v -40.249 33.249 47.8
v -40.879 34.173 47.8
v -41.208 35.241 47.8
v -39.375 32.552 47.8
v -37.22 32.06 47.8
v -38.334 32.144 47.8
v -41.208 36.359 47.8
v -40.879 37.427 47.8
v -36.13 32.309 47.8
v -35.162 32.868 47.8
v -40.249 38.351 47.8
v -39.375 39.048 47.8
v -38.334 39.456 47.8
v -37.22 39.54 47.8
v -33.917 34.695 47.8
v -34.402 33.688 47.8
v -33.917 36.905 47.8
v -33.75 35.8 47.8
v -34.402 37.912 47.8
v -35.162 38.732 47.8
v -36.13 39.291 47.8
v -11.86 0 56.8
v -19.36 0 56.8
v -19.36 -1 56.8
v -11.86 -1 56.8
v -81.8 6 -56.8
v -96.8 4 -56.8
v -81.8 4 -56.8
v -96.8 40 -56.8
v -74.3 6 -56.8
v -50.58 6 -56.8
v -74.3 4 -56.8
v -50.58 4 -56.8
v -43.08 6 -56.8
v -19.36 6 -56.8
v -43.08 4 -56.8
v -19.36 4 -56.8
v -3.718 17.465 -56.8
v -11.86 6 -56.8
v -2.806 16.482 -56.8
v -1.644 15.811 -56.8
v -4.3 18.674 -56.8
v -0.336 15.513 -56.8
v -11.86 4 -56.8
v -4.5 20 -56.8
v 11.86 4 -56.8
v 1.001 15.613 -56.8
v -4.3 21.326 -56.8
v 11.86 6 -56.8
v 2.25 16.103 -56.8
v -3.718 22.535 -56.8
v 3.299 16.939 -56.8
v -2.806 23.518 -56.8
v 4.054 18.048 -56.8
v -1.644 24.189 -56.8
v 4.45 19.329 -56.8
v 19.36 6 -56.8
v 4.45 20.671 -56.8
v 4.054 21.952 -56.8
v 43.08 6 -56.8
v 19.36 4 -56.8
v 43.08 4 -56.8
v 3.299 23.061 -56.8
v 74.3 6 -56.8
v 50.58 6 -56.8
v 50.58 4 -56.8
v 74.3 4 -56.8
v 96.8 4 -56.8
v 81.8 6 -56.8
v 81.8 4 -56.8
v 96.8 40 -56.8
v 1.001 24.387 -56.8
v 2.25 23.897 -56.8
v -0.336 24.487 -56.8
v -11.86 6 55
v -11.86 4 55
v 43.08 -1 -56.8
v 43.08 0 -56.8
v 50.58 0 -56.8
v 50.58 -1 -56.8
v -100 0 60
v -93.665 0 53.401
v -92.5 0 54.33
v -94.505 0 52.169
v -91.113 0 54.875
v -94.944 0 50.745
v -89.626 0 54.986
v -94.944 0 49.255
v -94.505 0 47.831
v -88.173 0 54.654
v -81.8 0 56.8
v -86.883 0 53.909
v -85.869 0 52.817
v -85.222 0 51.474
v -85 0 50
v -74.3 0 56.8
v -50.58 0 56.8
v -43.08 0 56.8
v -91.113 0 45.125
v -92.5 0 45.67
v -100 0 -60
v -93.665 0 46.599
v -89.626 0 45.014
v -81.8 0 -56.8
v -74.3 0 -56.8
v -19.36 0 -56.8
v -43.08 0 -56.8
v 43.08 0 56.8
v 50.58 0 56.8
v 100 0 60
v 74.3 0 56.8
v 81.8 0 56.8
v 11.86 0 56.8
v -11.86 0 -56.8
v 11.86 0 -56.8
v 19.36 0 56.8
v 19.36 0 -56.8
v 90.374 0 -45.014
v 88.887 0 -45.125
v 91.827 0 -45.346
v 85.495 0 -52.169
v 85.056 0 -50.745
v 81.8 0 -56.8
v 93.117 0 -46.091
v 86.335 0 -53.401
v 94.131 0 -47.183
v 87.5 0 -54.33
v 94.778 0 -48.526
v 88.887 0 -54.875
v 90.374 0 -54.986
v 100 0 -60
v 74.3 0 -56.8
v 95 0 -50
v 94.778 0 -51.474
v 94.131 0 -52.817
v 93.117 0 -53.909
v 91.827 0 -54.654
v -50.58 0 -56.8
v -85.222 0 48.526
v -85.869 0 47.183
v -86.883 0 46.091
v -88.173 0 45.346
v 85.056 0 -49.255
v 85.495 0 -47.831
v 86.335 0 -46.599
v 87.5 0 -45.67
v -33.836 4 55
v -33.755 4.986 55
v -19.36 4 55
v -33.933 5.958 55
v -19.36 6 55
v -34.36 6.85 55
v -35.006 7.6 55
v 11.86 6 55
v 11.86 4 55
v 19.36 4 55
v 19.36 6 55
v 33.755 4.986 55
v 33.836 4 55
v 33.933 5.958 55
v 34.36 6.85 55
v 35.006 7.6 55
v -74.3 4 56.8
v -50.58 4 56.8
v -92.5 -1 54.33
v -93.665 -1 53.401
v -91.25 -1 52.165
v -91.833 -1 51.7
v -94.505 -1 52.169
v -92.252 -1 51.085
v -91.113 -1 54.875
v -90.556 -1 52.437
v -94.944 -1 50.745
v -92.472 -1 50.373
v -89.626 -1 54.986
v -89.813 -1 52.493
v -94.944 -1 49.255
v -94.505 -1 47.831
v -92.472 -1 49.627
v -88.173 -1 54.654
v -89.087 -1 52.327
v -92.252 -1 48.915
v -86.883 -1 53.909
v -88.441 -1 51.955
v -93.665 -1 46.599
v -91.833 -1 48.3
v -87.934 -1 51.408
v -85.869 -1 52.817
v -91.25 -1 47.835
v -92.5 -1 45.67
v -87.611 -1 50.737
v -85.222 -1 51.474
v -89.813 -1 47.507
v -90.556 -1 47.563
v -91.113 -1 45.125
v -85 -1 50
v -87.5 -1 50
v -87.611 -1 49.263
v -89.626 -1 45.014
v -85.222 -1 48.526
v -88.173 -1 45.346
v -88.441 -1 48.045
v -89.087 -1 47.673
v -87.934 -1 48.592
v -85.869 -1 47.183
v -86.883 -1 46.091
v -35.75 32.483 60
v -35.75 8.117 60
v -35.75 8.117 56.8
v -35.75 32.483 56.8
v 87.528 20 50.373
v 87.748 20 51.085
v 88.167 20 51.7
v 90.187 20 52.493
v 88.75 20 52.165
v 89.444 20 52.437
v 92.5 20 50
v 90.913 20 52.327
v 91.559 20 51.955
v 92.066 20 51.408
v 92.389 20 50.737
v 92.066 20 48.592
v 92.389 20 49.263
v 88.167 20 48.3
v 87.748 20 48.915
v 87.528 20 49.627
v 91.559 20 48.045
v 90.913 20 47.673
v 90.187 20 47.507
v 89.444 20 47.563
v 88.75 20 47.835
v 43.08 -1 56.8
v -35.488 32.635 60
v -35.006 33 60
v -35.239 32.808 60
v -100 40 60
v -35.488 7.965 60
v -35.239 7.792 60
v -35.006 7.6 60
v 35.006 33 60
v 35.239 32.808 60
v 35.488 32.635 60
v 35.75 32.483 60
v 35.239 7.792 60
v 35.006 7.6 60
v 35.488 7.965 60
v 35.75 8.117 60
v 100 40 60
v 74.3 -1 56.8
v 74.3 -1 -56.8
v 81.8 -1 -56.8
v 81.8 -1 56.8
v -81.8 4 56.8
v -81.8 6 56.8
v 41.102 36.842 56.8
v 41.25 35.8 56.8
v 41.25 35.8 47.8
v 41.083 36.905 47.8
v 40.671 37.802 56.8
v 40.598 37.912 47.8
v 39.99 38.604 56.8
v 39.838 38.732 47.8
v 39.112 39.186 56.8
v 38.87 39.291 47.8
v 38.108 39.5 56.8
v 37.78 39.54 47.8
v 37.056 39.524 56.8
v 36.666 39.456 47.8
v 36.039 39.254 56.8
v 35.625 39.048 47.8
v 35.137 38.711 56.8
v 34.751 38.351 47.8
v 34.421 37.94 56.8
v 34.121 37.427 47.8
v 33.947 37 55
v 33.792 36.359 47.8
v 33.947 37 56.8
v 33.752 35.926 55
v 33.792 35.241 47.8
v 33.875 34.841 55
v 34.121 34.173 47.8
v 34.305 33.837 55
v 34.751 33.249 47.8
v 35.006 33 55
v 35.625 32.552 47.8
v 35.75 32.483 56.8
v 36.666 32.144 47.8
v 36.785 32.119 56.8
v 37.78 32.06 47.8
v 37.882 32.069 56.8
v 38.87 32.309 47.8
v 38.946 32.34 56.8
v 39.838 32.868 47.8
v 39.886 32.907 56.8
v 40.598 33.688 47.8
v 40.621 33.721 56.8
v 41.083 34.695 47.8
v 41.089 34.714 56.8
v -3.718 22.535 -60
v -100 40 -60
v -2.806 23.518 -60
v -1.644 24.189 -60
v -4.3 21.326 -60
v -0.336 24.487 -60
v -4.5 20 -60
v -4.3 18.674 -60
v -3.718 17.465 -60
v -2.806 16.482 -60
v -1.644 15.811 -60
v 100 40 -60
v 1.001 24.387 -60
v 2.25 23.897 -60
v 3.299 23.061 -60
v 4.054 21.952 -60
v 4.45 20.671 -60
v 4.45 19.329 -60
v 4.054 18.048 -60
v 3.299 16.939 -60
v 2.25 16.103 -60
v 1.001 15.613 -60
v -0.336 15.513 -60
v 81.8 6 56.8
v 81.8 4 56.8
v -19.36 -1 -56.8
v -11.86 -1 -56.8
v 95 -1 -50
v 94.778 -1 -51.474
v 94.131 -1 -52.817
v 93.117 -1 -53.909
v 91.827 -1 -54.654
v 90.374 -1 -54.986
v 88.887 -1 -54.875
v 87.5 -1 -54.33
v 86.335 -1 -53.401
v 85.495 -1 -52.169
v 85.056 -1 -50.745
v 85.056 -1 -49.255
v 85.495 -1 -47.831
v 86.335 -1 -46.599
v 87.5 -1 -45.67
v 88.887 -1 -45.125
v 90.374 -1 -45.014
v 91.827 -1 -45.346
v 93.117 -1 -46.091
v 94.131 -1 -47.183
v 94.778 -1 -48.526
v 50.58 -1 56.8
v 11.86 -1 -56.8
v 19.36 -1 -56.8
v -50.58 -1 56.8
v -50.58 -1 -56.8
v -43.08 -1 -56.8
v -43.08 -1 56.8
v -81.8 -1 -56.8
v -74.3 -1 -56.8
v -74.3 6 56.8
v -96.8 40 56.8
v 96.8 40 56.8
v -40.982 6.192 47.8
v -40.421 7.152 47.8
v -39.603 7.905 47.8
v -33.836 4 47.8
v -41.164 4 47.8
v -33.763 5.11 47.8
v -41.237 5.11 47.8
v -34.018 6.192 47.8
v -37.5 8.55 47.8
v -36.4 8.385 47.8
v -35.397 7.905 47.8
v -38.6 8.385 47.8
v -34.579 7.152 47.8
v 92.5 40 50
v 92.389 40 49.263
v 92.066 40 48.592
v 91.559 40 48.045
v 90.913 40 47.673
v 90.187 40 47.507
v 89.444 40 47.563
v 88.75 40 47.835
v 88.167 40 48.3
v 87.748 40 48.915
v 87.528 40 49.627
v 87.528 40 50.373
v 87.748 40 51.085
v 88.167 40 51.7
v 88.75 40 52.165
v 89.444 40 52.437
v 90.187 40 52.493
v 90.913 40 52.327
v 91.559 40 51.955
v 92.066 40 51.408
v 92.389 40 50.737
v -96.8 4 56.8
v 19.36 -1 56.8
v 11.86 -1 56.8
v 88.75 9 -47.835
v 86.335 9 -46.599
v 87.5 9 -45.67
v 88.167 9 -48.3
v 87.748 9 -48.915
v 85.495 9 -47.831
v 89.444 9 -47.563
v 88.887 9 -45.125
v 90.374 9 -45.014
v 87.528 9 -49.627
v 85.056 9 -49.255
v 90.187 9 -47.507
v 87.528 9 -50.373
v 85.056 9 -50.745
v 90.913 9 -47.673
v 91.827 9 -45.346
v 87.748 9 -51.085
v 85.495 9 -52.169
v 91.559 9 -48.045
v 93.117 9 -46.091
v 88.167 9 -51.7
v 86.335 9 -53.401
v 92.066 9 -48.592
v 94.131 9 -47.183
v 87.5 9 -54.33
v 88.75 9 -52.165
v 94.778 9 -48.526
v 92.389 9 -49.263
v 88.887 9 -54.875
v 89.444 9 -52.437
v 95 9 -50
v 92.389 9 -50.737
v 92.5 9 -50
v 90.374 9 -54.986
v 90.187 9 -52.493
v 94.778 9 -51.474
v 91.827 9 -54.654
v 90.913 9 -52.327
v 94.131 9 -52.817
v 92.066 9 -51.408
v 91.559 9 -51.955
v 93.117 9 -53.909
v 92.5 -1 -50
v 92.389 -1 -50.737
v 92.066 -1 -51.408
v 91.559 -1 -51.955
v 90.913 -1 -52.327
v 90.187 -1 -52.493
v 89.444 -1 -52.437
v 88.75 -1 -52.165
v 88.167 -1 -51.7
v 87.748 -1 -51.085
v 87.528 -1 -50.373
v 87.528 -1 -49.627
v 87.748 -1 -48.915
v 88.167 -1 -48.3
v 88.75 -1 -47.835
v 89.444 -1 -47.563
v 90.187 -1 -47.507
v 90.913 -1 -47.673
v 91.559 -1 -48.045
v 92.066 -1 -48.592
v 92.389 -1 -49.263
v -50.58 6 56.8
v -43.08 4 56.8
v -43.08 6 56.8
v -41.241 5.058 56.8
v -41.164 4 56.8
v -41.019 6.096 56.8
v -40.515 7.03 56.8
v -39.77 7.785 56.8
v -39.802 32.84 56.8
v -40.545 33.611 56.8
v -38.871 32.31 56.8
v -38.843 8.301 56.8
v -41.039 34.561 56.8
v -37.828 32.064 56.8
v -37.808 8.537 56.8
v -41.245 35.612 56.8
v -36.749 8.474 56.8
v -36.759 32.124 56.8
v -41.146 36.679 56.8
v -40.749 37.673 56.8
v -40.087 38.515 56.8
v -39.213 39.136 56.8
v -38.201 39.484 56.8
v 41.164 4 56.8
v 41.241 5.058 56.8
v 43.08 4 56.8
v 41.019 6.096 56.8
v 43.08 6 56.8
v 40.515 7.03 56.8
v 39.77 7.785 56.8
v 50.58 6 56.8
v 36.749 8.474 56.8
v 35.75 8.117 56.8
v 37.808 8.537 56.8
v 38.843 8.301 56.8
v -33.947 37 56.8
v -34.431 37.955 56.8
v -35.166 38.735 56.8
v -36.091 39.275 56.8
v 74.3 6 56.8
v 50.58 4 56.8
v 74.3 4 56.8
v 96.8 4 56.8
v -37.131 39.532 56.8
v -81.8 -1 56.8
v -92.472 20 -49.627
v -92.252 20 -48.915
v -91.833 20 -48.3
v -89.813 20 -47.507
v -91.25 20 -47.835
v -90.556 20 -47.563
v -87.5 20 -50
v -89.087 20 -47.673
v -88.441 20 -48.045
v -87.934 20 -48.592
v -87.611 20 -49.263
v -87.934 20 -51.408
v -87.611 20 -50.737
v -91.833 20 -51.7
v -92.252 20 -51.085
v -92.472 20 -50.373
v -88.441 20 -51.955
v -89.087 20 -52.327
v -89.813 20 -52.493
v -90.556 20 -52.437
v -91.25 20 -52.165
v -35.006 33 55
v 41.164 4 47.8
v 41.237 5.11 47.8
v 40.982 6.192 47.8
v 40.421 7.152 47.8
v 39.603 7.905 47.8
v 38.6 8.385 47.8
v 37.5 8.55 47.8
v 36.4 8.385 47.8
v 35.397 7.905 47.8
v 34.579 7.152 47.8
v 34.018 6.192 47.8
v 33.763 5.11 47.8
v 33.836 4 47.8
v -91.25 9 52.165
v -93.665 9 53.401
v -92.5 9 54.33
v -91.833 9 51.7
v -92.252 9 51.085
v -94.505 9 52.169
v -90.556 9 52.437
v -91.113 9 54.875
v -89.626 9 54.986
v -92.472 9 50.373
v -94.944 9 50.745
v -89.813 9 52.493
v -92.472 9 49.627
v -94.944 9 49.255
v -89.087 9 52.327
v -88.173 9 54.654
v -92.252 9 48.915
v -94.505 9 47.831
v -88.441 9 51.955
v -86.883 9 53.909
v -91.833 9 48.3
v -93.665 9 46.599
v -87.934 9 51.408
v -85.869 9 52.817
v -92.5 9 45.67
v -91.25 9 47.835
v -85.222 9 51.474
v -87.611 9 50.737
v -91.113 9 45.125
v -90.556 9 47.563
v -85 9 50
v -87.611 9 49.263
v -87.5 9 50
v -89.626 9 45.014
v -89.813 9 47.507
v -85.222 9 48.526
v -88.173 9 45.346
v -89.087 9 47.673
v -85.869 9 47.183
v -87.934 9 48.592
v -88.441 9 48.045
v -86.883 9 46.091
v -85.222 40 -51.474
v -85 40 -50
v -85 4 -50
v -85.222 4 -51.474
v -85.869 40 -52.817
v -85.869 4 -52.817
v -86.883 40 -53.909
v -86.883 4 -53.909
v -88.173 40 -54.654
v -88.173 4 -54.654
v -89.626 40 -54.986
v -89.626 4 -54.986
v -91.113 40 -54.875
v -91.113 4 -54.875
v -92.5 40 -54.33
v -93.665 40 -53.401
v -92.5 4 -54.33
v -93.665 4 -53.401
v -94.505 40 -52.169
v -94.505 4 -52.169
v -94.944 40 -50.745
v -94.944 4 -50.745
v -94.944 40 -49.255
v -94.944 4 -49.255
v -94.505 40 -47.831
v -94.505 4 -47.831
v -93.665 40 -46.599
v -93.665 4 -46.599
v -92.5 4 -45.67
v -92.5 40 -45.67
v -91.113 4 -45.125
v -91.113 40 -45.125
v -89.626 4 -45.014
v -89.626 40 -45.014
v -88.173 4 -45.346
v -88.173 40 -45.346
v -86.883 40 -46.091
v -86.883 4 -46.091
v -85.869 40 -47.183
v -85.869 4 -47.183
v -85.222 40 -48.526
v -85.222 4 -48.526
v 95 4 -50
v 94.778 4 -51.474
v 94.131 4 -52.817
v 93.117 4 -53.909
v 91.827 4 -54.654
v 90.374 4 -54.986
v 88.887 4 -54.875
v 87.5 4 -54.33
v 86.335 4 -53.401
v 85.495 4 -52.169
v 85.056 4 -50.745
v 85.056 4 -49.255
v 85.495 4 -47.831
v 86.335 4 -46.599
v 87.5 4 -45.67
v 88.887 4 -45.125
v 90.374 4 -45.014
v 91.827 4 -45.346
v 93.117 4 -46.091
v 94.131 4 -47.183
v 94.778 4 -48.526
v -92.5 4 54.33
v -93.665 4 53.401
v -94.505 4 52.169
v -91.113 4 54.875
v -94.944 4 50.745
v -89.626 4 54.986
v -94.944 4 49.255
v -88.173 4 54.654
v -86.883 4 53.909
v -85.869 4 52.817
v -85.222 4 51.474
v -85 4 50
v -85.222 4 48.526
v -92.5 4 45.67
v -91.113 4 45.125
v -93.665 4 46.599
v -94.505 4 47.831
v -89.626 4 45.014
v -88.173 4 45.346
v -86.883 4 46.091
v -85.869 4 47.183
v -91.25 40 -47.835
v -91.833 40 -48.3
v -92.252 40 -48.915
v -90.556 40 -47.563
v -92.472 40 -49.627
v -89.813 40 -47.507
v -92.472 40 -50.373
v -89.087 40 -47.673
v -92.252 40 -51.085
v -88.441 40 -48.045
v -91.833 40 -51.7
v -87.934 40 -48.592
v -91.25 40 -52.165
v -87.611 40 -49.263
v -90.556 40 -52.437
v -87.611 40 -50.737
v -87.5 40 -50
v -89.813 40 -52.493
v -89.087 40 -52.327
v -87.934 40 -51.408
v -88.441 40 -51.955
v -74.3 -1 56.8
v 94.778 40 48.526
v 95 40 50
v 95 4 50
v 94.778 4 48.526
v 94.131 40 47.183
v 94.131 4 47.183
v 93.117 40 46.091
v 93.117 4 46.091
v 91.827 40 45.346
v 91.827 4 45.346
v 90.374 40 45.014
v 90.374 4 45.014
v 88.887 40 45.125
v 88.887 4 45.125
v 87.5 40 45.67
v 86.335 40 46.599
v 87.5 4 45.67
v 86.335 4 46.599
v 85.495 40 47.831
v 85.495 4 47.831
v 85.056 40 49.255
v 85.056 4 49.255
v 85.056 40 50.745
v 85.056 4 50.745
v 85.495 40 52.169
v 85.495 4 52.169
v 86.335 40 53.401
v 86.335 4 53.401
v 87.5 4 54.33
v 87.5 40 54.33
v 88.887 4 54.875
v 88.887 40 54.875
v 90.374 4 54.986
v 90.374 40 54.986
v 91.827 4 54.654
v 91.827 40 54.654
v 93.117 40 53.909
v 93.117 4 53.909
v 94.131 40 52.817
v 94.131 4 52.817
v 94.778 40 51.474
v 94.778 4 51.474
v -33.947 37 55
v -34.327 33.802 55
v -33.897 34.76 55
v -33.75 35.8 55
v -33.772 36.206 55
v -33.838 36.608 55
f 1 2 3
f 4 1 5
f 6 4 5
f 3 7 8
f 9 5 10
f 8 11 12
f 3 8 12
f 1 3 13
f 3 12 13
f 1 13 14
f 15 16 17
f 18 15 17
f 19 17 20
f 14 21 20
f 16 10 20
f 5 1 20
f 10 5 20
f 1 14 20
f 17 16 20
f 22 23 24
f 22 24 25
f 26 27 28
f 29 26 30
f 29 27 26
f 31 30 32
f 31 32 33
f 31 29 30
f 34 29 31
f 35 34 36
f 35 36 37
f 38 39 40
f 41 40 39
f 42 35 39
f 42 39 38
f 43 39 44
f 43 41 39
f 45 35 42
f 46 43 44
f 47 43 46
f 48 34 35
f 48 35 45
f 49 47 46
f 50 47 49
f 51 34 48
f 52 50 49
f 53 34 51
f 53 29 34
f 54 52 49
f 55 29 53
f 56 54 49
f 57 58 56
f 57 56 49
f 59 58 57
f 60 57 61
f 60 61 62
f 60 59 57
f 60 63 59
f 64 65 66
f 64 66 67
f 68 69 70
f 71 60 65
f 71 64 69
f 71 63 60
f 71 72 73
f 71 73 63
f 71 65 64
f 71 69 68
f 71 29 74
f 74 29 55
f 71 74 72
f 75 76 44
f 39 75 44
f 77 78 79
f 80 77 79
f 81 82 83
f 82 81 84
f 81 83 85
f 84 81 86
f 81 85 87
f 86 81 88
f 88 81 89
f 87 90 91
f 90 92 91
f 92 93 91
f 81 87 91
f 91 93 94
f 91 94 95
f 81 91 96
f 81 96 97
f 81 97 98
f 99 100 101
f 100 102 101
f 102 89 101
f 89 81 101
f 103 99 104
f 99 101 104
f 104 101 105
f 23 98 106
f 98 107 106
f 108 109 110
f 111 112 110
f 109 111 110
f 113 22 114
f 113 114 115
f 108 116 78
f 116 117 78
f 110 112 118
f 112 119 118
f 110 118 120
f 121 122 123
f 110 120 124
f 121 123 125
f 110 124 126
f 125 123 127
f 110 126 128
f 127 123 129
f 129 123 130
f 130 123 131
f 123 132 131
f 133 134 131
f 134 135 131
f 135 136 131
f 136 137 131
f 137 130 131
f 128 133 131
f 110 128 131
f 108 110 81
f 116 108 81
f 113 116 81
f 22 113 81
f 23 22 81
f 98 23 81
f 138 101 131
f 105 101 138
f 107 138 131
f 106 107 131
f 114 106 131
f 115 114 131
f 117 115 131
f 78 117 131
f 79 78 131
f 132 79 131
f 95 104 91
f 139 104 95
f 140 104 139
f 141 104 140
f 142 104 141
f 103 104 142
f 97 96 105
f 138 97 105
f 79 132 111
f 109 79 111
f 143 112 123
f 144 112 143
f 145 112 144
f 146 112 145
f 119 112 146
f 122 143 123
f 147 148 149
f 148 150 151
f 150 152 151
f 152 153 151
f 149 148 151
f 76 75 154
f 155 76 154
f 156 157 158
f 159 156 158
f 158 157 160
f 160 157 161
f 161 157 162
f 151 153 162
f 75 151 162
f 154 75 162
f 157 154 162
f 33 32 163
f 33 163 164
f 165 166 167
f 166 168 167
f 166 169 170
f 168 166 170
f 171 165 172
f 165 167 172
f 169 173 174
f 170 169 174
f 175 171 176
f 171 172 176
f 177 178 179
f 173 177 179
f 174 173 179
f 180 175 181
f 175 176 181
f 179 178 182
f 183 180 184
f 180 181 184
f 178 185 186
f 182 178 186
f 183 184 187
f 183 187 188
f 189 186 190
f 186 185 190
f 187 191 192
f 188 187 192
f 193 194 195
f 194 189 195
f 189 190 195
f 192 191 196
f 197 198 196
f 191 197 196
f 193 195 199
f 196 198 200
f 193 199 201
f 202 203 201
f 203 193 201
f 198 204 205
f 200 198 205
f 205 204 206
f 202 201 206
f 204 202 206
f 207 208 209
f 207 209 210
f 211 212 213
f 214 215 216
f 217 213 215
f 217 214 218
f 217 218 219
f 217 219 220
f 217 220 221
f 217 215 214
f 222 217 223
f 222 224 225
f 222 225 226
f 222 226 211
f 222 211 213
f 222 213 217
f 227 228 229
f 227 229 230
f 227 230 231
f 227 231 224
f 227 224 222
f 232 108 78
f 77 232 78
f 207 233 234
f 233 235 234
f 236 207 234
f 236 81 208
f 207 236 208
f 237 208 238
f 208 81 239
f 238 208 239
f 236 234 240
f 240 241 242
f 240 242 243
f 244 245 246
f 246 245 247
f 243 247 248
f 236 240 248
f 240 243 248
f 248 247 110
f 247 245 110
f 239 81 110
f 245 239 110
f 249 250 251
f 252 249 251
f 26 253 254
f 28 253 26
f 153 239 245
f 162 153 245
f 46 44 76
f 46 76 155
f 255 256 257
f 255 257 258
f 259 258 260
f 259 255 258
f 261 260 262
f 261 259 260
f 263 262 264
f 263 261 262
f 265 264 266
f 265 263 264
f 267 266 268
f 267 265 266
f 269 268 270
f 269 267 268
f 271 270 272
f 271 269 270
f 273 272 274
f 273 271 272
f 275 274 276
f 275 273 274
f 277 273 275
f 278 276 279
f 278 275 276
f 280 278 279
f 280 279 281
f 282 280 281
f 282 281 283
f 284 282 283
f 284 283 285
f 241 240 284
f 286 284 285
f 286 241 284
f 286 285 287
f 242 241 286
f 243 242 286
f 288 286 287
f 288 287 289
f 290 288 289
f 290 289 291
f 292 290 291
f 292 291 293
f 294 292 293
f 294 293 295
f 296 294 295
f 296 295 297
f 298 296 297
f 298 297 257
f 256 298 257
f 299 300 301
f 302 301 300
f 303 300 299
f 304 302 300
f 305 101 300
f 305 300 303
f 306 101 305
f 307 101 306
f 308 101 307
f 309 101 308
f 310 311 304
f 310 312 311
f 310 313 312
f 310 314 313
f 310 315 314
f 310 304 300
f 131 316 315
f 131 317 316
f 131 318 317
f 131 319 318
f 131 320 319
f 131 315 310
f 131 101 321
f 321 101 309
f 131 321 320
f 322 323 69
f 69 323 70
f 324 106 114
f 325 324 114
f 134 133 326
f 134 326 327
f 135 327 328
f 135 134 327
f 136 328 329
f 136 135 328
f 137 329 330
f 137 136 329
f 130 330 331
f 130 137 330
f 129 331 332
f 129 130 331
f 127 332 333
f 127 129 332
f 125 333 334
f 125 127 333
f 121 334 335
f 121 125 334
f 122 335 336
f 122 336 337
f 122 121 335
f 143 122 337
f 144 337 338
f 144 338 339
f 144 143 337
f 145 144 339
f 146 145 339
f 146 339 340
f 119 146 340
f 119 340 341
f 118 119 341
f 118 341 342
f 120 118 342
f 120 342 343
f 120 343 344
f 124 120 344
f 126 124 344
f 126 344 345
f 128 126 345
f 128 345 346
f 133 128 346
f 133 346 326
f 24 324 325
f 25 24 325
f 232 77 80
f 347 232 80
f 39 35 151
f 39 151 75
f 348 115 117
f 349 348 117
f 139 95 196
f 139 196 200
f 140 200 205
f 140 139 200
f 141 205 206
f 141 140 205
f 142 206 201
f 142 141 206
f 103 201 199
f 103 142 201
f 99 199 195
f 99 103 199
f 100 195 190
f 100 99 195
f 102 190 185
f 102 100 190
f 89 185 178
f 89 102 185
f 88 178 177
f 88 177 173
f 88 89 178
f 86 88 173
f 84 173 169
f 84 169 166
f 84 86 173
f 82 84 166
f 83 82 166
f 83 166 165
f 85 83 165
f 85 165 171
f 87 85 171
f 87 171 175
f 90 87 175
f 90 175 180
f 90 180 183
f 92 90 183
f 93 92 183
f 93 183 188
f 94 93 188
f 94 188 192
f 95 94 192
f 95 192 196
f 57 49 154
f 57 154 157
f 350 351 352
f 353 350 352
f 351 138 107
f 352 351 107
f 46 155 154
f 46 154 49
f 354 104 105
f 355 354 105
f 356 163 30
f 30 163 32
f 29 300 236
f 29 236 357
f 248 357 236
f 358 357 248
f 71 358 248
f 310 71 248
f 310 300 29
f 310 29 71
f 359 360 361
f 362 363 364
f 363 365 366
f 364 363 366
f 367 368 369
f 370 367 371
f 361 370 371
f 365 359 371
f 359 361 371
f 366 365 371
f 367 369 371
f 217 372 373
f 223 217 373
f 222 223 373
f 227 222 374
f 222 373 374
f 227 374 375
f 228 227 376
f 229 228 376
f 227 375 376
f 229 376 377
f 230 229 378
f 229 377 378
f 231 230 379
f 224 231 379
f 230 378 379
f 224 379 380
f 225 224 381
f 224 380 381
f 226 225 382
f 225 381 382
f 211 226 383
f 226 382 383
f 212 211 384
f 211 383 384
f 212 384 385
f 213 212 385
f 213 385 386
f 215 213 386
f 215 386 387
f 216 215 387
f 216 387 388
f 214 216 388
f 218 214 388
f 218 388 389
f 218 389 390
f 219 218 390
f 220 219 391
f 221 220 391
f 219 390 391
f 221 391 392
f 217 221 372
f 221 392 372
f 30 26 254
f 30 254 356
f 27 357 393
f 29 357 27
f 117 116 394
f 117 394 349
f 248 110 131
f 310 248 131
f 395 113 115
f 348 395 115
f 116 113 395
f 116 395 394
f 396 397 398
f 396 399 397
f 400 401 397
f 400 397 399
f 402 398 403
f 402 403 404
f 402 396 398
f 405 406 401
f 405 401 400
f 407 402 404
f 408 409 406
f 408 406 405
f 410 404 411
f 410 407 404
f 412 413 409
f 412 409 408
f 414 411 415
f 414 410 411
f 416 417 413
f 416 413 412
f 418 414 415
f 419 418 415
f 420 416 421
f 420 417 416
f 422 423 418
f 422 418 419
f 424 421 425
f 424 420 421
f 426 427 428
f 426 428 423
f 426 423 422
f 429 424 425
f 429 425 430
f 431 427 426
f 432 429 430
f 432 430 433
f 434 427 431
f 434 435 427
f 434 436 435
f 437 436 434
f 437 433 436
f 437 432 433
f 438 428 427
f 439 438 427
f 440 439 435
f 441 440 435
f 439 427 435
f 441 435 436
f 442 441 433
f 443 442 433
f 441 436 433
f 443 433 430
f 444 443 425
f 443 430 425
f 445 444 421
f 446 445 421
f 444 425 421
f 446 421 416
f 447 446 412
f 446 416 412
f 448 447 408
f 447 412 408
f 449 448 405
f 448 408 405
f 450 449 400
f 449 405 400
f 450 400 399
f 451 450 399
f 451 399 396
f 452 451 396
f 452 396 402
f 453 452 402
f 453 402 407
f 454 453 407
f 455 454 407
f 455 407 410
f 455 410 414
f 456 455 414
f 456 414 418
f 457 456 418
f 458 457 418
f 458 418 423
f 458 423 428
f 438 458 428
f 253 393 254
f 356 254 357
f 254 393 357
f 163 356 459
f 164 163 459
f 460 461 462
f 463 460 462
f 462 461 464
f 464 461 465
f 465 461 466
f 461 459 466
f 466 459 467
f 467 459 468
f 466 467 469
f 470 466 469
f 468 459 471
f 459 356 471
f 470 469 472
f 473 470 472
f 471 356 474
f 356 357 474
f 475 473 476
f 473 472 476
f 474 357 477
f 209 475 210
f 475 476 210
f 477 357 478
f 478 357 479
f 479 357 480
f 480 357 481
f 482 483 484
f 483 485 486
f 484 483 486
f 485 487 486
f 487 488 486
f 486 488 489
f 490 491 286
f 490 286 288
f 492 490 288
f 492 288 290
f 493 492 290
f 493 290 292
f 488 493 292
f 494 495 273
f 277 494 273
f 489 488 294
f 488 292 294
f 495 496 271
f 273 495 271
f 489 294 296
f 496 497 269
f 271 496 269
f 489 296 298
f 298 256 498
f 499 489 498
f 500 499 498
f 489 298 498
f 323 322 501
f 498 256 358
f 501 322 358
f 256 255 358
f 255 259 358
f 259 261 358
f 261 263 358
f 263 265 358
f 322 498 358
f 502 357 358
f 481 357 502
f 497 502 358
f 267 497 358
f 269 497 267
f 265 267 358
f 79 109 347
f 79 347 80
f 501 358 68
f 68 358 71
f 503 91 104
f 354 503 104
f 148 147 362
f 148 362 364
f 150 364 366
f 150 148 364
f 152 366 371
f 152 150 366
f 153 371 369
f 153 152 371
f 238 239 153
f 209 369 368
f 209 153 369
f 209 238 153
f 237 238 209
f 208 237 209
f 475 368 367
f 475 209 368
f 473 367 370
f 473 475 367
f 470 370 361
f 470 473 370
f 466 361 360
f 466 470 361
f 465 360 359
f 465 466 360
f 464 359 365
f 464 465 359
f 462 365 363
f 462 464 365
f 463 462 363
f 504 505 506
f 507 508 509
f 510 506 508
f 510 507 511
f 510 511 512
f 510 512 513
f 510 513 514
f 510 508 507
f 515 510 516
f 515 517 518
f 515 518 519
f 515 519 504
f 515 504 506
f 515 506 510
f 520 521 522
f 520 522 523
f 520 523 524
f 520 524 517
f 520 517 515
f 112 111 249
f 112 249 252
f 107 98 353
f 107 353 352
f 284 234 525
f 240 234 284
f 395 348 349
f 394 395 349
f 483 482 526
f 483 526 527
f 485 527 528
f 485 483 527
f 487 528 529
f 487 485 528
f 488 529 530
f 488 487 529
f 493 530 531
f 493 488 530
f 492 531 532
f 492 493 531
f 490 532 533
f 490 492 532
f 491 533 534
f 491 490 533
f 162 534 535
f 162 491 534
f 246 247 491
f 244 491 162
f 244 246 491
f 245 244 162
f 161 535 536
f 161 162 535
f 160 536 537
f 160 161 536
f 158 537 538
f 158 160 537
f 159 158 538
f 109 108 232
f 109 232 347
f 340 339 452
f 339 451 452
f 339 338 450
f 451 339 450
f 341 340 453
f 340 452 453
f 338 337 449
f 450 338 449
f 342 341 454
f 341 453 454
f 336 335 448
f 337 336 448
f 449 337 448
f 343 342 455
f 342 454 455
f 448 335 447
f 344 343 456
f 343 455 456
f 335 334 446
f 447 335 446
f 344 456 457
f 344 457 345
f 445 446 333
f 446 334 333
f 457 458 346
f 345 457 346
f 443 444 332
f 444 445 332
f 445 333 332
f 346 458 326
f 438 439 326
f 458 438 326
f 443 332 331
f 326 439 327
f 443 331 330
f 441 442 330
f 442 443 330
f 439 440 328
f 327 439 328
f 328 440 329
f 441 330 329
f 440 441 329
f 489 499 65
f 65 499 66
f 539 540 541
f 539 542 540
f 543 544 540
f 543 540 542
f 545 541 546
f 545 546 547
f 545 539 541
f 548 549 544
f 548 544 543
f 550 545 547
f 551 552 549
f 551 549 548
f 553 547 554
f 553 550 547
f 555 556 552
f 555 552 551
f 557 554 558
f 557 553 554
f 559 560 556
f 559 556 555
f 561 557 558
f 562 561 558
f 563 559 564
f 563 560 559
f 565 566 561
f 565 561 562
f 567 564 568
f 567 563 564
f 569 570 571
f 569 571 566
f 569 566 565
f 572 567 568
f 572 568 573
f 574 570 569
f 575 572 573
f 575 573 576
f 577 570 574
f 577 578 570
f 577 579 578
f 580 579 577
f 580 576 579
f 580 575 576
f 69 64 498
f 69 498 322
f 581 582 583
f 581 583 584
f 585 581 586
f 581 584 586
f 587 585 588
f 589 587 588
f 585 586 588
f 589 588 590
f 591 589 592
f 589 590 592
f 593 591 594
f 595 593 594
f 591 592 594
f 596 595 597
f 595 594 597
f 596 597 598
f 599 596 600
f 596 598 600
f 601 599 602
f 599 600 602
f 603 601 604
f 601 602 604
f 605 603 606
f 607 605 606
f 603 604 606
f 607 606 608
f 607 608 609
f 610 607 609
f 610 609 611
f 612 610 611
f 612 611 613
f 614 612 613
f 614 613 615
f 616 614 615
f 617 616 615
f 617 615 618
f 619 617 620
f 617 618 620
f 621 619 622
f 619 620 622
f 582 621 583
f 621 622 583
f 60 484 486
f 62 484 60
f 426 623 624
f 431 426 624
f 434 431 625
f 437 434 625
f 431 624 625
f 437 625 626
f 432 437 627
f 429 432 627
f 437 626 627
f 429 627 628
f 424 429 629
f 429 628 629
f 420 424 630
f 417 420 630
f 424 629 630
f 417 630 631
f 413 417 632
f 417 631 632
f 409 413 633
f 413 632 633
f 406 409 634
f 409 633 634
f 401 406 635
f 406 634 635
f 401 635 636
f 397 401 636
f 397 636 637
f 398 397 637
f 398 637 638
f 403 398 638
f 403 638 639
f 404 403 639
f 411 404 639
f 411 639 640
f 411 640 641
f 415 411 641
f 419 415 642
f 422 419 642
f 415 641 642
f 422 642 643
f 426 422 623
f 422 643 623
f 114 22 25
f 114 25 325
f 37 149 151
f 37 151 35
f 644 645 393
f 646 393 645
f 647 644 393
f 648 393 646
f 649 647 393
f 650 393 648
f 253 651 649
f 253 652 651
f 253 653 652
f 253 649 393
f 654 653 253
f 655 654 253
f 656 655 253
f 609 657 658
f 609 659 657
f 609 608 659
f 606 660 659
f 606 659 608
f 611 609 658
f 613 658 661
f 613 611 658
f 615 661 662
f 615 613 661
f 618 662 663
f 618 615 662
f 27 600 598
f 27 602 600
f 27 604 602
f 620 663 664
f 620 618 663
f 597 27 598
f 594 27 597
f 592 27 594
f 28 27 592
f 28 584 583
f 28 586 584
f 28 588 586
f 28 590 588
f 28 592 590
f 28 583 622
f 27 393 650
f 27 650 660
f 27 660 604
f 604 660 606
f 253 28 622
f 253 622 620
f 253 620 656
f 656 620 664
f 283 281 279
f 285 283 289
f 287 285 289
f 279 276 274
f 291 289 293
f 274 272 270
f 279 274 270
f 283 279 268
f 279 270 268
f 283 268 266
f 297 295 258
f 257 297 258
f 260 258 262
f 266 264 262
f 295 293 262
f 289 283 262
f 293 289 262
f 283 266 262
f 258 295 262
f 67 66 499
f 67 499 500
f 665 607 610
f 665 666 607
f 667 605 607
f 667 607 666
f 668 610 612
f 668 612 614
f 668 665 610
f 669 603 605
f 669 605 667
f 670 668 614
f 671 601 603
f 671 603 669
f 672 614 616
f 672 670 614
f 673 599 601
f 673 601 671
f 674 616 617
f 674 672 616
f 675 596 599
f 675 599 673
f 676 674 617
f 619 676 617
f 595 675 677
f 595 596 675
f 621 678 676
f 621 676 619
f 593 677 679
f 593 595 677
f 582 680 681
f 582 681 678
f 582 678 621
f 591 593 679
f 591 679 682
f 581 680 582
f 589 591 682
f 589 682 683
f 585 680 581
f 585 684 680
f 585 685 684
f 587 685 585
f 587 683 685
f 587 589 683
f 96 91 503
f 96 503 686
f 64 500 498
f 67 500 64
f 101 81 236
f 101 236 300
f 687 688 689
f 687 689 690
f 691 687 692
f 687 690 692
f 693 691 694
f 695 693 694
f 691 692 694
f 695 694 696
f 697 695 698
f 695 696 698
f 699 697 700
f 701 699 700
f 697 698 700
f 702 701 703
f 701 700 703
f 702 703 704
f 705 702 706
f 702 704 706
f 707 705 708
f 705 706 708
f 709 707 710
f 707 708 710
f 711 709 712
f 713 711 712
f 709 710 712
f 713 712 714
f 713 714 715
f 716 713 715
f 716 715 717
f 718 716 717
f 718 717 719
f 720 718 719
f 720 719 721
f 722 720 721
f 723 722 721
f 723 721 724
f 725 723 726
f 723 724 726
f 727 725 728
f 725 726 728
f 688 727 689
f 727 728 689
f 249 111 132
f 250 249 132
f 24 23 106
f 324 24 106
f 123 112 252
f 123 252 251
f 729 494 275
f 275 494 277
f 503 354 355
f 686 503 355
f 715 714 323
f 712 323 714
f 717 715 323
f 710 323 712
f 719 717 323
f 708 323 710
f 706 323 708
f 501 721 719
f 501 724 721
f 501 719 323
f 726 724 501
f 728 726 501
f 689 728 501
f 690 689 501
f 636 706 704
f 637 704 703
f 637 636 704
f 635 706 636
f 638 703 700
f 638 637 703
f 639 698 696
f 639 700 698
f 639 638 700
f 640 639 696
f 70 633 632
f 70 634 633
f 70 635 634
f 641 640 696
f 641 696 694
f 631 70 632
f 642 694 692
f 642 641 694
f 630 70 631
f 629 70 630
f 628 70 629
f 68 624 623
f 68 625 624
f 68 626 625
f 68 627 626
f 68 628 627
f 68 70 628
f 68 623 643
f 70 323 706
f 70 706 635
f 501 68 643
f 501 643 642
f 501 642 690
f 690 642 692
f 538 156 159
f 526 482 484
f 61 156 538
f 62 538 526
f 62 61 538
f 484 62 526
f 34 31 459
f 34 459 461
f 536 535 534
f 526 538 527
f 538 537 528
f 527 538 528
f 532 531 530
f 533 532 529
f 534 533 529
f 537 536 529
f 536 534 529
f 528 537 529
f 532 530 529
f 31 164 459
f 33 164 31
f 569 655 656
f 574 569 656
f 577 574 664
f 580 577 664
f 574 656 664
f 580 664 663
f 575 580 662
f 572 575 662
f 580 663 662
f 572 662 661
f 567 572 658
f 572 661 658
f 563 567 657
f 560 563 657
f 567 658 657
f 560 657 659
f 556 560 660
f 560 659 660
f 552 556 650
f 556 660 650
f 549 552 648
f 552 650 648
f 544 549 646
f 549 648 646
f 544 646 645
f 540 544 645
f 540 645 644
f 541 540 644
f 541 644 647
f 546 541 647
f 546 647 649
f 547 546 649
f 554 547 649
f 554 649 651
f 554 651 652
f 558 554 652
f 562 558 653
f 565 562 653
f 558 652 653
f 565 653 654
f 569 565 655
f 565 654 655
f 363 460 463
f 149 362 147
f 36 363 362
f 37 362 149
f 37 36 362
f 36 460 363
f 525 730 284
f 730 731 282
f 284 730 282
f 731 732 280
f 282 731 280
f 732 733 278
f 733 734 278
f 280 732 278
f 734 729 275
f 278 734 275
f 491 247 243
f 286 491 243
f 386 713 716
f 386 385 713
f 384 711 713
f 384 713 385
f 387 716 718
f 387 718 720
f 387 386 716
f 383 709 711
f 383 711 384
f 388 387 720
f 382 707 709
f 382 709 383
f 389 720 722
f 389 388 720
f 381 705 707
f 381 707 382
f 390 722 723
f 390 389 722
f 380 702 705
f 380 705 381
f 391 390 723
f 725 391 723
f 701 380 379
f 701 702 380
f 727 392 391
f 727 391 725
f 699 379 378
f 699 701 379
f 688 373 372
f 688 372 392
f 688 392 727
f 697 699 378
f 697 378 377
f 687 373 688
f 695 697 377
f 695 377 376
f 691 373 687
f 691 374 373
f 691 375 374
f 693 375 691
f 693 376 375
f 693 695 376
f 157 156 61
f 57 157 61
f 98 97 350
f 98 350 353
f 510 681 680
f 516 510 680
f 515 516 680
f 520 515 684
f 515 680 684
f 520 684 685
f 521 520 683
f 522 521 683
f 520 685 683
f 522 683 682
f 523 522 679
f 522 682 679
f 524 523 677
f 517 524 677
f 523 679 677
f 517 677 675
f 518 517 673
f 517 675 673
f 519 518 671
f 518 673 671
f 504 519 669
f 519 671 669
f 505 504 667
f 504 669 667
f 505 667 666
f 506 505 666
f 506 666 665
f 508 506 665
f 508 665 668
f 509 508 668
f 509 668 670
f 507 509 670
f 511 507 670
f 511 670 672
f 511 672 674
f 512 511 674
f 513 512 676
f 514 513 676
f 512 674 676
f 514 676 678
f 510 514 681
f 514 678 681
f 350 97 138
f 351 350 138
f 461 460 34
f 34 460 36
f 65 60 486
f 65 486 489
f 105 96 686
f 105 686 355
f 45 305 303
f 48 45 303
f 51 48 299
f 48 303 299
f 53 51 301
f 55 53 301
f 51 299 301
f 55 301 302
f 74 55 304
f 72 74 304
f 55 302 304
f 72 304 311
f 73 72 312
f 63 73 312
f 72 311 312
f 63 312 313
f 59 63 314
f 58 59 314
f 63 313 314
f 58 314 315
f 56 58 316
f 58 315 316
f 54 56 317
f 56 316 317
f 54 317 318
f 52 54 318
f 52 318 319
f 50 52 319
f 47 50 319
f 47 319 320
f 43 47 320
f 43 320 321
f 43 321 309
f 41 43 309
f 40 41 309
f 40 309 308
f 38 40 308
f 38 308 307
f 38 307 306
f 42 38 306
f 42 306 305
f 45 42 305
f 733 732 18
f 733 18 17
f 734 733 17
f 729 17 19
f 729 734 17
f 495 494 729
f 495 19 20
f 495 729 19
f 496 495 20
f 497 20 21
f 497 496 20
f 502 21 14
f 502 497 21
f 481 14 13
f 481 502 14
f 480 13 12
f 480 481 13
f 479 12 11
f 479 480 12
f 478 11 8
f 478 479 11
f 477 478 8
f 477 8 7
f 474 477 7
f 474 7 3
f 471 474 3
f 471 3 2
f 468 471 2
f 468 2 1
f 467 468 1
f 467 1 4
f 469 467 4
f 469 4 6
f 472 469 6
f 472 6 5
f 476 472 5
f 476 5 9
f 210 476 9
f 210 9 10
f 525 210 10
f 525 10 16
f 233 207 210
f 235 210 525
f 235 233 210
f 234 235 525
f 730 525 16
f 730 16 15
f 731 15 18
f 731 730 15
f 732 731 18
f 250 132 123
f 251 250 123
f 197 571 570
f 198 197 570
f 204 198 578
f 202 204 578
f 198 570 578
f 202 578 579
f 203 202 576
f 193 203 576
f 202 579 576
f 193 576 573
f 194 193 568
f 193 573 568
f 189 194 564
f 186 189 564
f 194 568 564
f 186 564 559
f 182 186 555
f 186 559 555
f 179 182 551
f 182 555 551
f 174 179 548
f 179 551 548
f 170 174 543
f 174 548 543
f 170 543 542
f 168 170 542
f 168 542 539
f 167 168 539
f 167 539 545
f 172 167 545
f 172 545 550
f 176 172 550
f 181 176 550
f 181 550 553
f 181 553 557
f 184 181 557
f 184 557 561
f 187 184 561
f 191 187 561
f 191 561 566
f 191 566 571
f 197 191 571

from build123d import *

# Parameters (mm, degrees)
CROQUIS1_W                   = 200
CROQUIS1_H                   = 120
SALIENTE_EXTRUIR1_DEPTH      = 40
CROQUIS2_W                   = 193.6
CROQUIS2_H                   = 113.6
CORTAR_EXTRUIR1_DEPTH        = 36
CROQUIS3_W                   = 71.5
CROQUIS3_H                   = 25.4
CORTAR_EXTRUIR2_DEPTH        = 3.5
CROQUIS4_R                   = 3.75
SALIENTE_EXTRUIR2_DEPTH      = 12.2
CROQUIS5_W                   = 71.5
CROQUIS5_H                   = 4
SALIENTE_EXTRUIR3_DEPTH      = 5
SALIENTE_EXTRUIR4_DEPTH      = 2
SALIENTE_EXTRUIR4_DEPTH_BACK = 5
CROQUIS6_W                   = 7.5
CROQUIS6_H                   = 113.6
CROQUIS7_R                   = 4.5
CORTAR_EXTRUIR3_DEPTH        = 3.3
CROQUIS6_5_R                 = 5
SALIENTE_EXTRUIR5_DEPTH      = 36
SALIENTE_EXTRUIR6_DEPTH      = 5
SALIENTE_EXTRUIR6_DEPTH_BACK = 5
CROQUIS6_6_R                 = 5
CROQUIS8_R                   = 2.5
CORTAR_EXTRUIR4_DEPTH        = 20
CROQUIS9_R                   = 2.5
CORTAR_EXTRUIR5_DEPTH        = 121.66896867


with BuildPart() as part:
    # Croquis1 → Saliente-Extruir1 (new body)
    with BuildSketch(Plane(origin=(0, 0, 0), x_dir=(1, 0, 0), z_dir=(0, 1, 0))):
        Rectangle(CROQUIS1_W, CROQUIS1_H)
    extrude(amount=SALIENTE_EXTRUIR1_DEPTH)

    # Croquis2 → Cortar-Extruir1 (cut)
    with BuildSketch(Plane(origin=(0, 40, 0), x_dir=(1, 0, 0), z_dir=(0, 1, 0))):
        Rectangle(CROQUIS2_W, CROQUIS2_H)
    extrude(amount=-CORTAR_EXTRUIR1_DEPTH, mode=Mode.SUBTRACT)

    # Croquis3 → Cortar-Extruir2 (cut)
    with BuildSketch(Plane.XY.offset(60)):
        with Locations((0, 20.3)):
            Rectangle(CROQUIS3_W, CROQUIS3_H)
    extrude(amount=-CORTAR_EXTRUIR2_DEPTH, mode=Mode.SUBTRACT)

    # Croquis4 → Saliente-Extruir2 (add)
    with BuildSketch(Plane.XY.offset(60)):
        with Locations((-37.5, 35.8)):
            Circle(CROQUIS4_R)
        with Locations((37.5, 35.8)):
            Circle(CROQUIS4_R)
        with Locations((37.5, 4.8)):
            Circle(CROQUIS4_R)
        with Locations((-37.5, 4.8)):
            Circle(CROQUIS4_R)
    extrude(amount=-SALIENTE_EXTRUIR2_DEPTH)

    # Croquis5 → Saliente-Extruir3 (add)
    with BuildSketch(Plane.XY.offset(60)):
        with Locations((0, 5.6)):
            Rectangle(CROQUIS5_W, CROQUIS5_H)
        with Locations((0, 35)):
            Rectangle(CROQUIS5_W, CROQUIS5_H)
    extrude(amount=-SALIENTE_EXTRUIR3_DEPTH)

    # Croquis6 → Saliente-Extruir4 (add, two sides: drawn at the far end of the back side and taken through both)
    with BuildSketch(Plane(origin=(0, 4, 0), x_dir=(1, 0, 0), z_dir=(0, 1, 0)).offset(-SALIENTE_EXTRUIR4_DEPTH_BACK)):
        with Locations((-78.05, 0)):
            Rectangle(CROQUIS6_W, CROQUIS6_H)
        with Locations((-46.83, 0)):
            Rectangle(CROQUIS6_W, CROQUIS6_H)
        with Locations((-15.61, 0)):
            Rectangle(CROQUIS6_W, CROQUIS6_H)
        with Locations((15.61, 0)):
            Rectangle(CROQUIS6_W, CROQUIS6_H)
        with Locations((46.83, 0)):
            Rectangle(CROQUIS6_W, CROQUIS6_H)
        with Locations((78.05, 0)):
            Rectangle(CROQUIS6_W, CROQUIS6_H)
    extrude(amount=SALIENTE_EXTRUIR4_DEPTH + SALIENTE_EXTRUIR4_DEPTH_BACK)

    # Croquis7 → Cortar-Extruir3 (cut)
    with BuildSketch(Plane(origin=(0, 0, -60), x_dir=(-1, 0, 0), z_dir=(0, 0, -1))):
        with Locations((0, 20)):
            Circle(CROQUIS7_R)
    extrude(amount=-CORTAR_EXTRUIR3_DEPTH, mode=Mode.SUBTRACT)

    # Croquis6<5> → Saliente-Extruir5 (add)
    with BuildSketch(Plane(origin=(0, 4, 0), x_dir=(1, 0, 0), z_dir=(0, 1, 0))):
        with Locations((-90, 50)):
            Circle(CROQUIS6_5_R)
        with Locations((90, -50)):
            Circle(CROQUIS6_5_R)
    extrude(amount=SALIENTE_EXTRUIR5_DEPTH)

    # Croquis6<6> → Saliente-Extruir6 (add, two sides: drawn at the far end of the back side and taken through both)
    with BuildSketch(Plane(origin=(0, 4, 0), x_dir=(1, 0, 0), z_dir=(0, 1, 0)).offset(-SALIENTE_EXTRUIR6_DEPTH_BACK)):
        with Locations((90, 50)):
            Circle(CROQUIS6_6_R)
        with Locations((-90, -50)):
            Circle(CROQUIS6_6_R)
    extrude(amount=SALIENTE_EXTRUIR6_DEPTH + SALIENTE_EXTRUIR6_DEPTH_BACK)

    # Croquis8 → Cortar-Extruir4 (cut)
    with BuildSketch(Plane(origin=(0, 40, 0), x_dir=(1, 0, 0), z_dir=(0, 1, 0))):
        with Locations((-90, 50)):
            Circle(CROQUIS8_R)
        with Locations((90, -50)):
            Circle(CROQUIS8_R)
    extrude(amount=-CORTAR_EXTRUIR4_DEPTH, mode=Mode.SUBTRACT)

    # Croquis9 → Cortar-Extruir5 (cut, through all)
    with BuildSketch(Plane(origin=(0, 9, 0), x_dir=(1, 0, 0), z_dir=(0, 1, 0))):
        with Locations((-90, -50)):
            Circle(CROQUIS9_R)
        with Locations((90, 50)):
            Circle(CROQUIS9_R)
    extrude(amount=-CORTAR_EXTRUIR5_DEPTH, mode=Mode.SUBTRACT)


solid = part.part
